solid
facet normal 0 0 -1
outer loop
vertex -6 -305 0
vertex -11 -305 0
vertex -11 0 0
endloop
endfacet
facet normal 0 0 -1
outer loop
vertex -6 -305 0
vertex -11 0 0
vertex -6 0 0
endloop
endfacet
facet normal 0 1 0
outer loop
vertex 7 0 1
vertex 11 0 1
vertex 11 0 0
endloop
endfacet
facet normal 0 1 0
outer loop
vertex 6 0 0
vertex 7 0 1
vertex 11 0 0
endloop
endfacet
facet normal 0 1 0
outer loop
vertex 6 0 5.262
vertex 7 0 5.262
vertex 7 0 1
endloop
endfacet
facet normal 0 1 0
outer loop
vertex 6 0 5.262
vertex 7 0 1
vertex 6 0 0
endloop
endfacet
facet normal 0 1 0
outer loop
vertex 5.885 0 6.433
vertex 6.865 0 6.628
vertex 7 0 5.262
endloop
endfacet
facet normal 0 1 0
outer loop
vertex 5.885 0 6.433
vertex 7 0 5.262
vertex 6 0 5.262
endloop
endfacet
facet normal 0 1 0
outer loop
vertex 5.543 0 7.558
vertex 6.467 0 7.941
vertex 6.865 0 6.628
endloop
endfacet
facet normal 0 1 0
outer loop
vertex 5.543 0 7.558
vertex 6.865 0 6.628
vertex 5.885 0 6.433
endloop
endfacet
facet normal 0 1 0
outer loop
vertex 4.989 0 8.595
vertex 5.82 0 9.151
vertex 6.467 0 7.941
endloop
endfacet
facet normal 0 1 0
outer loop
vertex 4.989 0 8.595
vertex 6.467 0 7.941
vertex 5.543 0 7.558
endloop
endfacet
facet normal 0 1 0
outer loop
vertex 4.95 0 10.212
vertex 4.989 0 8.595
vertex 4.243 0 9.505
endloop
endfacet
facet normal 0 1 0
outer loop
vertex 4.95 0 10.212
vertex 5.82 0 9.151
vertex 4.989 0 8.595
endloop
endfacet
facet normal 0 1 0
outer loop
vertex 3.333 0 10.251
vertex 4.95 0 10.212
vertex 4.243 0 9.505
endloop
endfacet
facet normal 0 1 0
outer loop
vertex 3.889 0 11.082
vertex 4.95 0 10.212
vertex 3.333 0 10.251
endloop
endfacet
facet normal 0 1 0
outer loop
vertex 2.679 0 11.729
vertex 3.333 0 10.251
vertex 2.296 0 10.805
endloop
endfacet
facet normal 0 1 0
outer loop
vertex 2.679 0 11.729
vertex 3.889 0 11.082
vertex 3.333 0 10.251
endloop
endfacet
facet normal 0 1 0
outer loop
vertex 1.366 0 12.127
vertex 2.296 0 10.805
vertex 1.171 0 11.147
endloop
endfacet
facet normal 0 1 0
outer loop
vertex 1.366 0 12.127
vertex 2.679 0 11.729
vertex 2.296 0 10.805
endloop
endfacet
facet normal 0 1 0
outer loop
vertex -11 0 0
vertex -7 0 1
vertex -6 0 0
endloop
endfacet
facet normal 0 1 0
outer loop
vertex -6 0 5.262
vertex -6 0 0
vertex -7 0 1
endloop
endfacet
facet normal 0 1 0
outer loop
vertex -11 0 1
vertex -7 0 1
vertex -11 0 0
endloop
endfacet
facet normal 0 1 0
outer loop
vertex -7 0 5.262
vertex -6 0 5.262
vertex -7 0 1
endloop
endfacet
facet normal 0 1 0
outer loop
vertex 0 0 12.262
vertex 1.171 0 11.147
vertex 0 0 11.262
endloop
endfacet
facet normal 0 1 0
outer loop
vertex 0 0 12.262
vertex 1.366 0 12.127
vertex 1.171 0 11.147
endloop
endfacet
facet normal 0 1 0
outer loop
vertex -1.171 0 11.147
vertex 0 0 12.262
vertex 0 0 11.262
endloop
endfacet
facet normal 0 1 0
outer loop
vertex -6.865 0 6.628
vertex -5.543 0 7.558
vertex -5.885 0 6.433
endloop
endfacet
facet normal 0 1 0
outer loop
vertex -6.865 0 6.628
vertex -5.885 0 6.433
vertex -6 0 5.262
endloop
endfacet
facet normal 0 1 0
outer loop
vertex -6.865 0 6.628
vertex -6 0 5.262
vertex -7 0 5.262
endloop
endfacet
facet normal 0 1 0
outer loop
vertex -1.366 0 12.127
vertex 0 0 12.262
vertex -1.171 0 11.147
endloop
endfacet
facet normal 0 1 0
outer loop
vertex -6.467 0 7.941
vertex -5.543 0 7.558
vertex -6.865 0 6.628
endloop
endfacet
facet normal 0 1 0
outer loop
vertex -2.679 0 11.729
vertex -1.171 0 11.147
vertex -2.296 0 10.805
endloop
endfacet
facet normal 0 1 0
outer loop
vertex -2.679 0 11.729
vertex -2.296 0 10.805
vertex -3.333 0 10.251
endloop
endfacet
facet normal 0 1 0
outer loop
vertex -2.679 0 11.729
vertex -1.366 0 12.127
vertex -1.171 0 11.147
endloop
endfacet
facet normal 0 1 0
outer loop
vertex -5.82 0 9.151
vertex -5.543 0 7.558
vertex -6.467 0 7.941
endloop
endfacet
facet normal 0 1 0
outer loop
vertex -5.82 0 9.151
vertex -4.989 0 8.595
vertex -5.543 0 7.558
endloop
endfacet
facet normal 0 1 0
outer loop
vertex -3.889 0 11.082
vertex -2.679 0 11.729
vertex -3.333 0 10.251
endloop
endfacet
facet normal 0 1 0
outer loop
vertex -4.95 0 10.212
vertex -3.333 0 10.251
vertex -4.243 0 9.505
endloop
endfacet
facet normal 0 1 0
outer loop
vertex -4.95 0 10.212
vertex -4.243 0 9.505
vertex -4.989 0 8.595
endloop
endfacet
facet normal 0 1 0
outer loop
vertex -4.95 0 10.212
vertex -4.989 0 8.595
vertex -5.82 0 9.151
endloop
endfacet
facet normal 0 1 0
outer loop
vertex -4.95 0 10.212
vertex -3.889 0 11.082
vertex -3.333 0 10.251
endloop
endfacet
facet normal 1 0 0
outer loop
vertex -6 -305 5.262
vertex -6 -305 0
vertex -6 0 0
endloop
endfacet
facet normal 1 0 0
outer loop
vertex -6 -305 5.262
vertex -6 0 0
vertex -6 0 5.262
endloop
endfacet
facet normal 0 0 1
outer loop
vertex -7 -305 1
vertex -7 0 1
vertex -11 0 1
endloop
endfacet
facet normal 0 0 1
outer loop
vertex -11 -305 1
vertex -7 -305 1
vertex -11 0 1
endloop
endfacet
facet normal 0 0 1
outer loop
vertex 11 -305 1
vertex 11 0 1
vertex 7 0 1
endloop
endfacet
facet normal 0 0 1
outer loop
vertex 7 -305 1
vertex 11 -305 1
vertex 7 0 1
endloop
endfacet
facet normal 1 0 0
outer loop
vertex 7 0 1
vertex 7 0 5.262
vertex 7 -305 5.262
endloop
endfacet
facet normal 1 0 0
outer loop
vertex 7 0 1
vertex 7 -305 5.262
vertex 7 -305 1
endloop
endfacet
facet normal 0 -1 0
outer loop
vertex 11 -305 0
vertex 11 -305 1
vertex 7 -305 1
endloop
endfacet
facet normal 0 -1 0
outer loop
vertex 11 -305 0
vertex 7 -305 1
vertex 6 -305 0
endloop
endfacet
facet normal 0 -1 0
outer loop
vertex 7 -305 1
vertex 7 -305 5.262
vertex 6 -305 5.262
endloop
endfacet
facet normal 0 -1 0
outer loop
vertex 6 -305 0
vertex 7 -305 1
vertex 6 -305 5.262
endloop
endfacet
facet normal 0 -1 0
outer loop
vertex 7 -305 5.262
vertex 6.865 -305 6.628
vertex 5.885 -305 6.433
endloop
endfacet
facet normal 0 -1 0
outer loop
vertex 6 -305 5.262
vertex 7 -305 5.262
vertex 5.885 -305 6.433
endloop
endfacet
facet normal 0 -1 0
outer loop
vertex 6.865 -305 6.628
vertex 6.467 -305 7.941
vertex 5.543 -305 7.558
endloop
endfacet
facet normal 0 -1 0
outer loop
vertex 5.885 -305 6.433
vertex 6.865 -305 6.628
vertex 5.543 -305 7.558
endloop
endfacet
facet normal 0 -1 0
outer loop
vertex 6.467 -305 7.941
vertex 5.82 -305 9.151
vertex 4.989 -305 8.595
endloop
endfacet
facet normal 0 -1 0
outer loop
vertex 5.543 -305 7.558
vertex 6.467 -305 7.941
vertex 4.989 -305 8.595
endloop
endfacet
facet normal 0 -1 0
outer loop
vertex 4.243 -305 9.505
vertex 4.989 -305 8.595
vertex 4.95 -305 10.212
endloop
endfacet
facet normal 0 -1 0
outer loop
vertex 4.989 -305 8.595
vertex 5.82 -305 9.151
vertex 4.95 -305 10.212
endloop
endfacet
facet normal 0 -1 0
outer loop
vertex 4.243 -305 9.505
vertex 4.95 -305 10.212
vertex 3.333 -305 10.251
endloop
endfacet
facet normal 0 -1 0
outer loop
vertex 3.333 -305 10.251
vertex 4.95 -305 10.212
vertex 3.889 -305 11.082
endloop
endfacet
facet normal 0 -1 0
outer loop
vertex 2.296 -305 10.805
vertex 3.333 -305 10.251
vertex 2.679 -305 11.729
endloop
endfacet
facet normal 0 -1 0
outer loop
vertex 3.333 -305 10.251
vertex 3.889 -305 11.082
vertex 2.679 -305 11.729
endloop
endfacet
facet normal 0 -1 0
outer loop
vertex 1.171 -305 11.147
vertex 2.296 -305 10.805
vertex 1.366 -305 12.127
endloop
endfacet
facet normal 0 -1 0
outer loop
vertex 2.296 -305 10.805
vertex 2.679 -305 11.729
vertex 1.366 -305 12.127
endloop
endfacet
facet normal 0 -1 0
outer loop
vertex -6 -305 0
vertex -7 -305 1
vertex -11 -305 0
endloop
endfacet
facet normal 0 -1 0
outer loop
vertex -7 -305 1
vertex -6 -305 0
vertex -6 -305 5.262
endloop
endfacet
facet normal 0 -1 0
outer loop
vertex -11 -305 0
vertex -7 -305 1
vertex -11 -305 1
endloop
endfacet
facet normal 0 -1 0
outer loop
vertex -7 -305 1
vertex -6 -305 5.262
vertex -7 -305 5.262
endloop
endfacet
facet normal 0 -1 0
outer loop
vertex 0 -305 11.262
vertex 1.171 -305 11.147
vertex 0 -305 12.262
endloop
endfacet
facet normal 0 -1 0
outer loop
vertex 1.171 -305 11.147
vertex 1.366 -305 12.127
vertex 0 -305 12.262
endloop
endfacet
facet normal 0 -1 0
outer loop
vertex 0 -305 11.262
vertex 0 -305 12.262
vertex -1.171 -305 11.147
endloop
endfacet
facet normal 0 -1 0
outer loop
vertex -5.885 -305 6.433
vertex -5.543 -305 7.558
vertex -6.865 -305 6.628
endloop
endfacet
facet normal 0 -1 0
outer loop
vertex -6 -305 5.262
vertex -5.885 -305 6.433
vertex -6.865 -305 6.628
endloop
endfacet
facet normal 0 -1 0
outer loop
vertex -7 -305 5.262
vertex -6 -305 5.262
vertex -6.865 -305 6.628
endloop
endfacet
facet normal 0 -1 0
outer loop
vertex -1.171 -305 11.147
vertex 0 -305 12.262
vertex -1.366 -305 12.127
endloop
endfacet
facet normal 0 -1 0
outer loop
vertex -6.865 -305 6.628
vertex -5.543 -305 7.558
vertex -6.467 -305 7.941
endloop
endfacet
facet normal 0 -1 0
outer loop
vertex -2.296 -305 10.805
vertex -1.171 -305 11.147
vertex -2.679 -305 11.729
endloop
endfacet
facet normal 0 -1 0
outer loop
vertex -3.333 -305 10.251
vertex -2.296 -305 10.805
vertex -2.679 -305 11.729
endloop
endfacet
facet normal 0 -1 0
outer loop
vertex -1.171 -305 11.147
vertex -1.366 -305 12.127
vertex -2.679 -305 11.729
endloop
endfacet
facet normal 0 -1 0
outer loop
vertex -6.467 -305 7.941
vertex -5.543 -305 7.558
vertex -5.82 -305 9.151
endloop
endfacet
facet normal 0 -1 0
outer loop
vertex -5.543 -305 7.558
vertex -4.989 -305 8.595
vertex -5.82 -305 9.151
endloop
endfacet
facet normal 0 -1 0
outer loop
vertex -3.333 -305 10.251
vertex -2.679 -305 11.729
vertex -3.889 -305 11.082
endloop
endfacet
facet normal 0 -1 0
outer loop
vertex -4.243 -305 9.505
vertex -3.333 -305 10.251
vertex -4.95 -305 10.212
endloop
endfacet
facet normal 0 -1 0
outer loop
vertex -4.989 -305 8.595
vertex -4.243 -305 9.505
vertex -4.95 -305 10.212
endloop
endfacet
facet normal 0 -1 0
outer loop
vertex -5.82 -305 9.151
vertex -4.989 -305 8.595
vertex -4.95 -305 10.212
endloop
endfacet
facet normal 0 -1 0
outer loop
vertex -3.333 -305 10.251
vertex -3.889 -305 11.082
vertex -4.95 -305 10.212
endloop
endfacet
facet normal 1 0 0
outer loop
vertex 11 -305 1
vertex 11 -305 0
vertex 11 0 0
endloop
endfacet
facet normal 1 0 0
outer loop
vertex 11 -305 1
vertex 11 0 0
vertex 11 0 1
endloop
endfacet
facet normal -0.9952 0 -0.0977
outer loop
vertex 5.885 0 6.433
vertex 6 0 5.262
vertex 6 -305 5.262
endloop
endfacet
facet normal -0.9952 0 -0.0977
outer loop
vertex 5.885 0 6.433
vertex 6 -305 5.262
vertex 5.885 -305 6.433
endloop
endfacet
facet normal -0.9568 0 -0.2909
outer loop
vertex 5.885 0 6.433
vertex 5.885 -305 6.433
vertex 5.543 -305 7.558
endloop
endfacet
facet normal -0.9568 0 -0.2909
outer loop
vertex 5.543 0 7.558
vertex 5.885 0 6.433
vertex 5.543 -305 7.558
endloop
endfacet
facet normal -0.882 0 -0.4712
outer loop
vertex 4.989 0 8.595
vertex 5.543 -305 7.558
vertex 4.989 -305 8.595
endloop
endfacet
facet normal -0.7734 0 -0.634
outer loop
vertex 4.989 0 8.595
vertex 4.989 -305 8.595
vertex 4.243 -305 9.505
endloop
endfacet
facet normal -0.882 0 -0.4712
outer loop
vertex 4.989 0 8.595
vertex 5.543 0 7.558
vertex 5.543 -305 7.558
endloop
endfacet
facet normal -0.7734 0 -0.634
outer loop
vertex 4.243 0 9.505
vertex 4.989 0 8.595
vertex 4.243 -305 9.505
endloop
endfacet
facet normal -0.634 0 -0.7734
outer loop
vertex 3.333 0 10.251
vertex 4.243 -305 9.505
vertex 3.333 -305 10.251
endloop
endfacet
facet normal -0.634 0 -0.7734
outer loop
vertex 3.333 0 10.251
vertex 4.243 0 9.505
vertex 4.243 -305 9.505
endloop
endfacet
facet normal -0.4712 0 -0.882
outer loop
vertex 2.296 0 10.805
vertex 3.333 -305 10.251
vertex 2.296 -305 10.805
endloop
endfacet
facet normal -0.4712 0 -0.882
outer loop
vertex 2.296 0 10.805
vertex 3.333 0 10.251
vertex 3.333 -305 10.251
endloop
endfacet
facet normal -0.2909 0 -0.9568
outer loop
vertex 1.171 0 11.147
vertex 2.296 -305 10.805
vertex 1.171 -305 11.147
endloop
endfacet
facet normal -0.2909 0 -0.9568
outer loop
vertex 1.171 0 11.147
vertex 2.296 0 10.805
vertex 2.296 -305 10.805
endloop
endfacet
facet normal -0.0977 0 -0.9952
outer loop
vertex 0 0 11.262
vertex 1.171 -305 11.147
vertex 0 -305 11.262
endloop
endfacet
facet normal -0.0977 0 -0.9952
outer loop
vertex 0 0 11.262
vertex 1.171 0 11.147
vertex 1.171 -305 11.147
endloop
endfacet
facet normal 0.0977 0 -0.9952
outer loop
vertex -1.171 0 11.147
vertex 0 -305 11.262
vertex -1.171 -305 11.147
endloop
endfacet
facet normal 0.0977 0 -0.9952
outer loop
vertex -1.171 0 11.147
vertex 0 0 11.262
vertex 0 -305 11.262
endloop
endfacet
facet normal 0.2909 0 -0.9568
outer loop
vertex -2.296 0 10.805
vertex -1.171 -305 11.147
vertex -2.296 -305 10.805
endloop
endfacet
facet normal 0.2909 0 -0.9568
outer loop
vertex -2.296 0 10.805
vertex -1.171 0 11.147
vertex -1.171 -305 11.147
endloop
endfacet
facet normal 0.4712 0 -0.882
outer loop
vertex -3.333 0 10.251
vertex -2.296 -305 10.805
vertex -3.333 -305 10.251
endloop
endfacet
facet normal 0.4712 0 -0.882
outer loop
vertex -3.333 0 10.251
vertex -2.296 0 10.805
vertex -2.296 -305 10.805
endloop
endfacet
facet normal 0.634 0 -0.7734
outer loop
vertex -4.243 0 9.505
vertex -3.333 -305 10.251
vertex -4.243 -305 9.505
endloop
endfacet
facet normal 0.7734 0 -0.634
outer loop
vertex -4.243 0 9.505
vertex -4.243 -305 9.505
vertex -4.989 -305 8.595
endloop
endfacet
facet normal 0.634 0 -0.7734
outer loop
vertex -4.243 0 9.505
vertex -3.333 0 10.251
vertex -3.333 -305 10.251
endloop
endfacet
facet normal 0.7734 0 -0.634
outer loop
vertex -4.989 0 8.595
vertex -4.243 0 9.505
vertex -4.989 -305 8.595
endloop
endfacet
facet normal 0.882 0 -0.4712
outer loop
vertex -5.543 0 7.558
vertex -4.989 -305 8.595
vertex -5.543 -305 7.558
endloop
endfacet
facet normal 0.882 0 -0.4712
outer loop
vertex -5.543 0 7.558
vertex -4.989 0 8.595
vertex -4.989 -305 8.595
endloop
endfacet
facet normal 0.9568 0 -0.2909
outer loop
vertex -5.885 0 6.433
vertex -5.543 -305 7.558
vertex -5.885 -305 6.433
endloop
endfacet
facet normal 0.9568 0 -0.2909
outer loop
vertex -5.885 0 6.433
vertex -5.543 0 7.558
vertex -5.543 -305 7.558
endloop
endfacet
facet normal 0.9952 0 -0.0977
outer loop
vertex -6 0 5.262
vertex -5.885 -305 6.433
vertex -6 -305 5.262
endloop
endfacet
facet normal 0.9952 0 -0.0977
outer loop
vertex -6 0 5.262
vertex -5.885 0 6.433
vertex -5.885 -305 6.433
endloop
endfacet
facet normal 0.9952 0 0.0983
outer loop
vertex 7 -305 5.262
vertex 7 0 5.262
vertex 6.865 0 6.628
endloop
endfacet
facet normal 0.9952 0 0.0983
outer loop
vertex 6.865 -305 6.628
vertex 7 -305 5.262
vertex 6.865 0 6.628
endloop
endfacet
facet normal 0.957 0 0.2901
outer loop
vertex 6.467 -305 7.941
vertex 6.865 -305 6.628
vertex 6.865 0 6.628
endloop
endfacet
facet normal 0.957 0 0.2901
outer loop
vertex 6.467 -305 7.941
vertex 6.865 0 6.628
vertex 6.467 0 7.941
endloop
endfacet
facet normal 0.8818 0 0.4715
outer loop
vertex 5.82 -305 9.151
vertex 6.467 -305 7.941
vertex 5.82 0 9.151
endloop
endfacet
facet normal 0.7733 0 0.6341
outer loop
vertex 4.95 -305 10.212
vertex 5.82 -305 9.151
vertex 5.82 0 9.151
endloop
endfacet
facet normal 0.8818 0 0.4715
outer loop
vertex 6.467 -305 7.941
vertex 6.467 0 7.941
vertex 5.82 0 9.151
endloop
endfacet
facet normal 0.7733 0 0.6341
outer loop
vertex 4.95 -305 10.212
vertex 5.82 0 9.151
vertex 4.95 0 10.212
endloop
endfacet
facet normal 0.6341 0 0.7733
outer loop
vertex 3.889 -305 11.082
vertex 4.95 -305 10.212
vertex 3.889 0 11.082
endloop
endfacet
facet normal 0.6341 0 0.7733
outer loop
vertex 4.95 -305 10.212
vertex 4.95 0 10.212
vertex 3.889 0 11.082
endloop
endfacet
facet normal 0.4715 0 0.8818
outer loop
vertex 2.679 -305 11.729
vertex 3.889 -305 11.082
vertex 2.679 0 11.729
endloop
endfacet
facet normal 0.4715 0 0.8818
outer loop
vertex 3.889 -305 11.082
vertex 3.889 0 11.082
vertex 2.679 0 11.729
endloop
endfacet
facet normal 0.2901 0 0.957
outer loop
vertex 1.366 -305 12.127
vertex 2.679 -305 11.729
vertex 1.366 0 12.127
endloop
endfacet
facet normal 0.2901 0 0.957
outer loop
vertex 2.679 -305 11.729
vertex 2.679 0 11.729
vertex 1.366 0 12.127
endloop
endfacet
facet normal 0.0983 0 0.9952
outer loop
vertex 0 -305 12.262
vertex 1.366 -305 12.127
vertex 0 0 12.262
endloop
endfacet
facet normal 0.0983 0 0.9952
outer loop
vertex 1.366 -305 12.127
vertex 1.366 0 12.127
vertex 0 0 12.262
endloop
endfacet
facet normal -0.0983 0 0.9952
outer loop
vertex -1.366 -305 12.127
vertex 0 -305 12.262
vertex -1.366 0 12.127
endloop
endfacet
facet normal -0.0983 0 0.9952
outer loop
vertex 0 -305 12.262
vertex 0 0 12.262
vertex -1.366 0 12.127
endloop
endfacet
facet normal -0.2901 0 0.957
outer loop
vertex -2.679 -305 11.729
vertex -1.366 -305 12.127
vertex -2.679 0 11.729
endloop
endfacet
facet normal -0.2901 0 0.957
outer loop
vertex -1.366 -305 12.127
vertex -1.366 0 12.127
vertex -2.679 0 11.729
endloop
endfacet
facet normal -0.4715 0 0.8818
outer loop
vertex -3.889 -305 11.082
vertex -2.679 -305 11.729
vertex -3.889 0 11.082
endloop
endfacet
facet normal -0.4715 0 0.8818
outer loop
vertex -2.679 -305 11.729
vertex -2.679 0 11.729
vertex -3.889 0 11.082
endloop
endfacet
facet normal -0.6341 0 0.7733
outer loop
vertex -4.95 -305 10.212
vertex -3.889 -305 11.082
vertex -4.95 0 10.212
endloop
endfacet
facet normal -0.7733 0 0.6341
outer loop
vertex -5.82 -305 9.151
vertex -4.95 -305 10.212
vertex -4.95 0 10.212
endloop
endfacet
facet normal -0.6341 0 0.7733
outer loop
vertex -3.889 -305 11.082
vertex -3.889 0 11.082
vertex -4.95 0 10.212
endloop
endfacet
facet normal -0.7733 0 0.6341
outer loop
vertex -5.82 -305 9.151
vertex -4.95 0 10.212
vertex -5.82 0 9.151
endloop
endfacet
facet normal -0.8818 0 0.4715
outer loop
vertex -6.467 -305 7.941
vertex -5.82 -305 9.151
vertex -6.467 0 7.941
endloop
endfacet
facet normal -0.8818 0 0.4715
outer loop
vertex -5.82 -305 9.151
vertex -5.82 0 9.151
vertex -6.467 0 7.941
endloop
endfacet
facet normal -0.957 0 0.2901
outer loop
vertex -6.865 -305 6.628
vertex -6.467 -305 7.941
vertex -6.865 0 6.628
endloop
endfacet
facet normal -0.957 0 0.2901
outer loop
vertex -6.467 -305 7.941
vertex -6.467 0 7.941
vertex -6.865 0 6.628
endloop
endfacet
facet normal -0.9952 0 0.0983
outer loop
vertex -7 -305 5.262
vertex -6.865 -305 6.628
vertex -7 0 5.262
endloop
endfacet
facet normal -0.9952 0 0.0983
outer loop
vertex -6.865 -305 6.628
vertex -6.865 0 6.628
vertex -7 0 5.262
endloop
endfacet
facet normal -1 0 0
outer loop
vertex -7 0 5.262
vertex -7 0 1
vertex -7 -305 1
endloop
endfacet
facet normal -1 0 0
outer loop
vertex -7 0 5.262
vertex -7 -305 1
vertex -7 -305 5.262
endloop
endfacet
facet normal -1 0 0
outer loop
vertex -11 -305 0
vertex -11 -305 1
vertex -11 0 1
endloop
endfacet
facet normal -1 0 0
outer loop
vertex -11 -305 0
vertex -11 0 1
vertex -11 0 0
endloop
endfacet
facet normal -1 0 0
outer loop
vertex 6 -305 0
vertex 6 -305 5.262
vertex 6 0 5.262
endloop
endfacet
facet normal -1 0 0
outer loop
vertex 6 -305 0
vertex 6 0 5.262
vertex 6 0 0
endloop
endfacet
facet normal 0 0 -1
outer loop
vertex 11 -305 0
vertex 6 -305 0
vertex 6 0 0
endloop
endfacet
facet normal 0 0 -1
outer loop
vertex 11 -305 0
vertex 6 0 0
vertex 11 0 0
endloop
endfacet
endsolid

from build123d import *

# Parameters (mm, degrees)
PAD_DEPTH = 305


with BuildPart() as part:
    # Sketch → Pad (new body)
    with BuildSketch(Plane.XZ):
        with BuildLine():
            ThreePointArc((6, 5.262), (0, 11.262), (-6, 5.262))
            Line((-6, 0), (-6, 5.262))
            Line((-11, 0), (-6, 0))
            Line((-11, 1), (-11, 0))
            Line((-7, 1), (-11, 1))
            Line((-7, 1), (-7, 5.262))
            ThreePointArc((7, 5.262), (0, 12.262), (-7, 5.262))
            Line((7, 5.262), (7, 1))
            Line((11, 1), (7, 1))
            Line((11, 0), (11, 1))
            Line((6, 0), (11, 0))
            Line((6, 5.262), (6, 0))
        make_face()
    extrude(amount=PAD_DEPTH)


solid = part.part
